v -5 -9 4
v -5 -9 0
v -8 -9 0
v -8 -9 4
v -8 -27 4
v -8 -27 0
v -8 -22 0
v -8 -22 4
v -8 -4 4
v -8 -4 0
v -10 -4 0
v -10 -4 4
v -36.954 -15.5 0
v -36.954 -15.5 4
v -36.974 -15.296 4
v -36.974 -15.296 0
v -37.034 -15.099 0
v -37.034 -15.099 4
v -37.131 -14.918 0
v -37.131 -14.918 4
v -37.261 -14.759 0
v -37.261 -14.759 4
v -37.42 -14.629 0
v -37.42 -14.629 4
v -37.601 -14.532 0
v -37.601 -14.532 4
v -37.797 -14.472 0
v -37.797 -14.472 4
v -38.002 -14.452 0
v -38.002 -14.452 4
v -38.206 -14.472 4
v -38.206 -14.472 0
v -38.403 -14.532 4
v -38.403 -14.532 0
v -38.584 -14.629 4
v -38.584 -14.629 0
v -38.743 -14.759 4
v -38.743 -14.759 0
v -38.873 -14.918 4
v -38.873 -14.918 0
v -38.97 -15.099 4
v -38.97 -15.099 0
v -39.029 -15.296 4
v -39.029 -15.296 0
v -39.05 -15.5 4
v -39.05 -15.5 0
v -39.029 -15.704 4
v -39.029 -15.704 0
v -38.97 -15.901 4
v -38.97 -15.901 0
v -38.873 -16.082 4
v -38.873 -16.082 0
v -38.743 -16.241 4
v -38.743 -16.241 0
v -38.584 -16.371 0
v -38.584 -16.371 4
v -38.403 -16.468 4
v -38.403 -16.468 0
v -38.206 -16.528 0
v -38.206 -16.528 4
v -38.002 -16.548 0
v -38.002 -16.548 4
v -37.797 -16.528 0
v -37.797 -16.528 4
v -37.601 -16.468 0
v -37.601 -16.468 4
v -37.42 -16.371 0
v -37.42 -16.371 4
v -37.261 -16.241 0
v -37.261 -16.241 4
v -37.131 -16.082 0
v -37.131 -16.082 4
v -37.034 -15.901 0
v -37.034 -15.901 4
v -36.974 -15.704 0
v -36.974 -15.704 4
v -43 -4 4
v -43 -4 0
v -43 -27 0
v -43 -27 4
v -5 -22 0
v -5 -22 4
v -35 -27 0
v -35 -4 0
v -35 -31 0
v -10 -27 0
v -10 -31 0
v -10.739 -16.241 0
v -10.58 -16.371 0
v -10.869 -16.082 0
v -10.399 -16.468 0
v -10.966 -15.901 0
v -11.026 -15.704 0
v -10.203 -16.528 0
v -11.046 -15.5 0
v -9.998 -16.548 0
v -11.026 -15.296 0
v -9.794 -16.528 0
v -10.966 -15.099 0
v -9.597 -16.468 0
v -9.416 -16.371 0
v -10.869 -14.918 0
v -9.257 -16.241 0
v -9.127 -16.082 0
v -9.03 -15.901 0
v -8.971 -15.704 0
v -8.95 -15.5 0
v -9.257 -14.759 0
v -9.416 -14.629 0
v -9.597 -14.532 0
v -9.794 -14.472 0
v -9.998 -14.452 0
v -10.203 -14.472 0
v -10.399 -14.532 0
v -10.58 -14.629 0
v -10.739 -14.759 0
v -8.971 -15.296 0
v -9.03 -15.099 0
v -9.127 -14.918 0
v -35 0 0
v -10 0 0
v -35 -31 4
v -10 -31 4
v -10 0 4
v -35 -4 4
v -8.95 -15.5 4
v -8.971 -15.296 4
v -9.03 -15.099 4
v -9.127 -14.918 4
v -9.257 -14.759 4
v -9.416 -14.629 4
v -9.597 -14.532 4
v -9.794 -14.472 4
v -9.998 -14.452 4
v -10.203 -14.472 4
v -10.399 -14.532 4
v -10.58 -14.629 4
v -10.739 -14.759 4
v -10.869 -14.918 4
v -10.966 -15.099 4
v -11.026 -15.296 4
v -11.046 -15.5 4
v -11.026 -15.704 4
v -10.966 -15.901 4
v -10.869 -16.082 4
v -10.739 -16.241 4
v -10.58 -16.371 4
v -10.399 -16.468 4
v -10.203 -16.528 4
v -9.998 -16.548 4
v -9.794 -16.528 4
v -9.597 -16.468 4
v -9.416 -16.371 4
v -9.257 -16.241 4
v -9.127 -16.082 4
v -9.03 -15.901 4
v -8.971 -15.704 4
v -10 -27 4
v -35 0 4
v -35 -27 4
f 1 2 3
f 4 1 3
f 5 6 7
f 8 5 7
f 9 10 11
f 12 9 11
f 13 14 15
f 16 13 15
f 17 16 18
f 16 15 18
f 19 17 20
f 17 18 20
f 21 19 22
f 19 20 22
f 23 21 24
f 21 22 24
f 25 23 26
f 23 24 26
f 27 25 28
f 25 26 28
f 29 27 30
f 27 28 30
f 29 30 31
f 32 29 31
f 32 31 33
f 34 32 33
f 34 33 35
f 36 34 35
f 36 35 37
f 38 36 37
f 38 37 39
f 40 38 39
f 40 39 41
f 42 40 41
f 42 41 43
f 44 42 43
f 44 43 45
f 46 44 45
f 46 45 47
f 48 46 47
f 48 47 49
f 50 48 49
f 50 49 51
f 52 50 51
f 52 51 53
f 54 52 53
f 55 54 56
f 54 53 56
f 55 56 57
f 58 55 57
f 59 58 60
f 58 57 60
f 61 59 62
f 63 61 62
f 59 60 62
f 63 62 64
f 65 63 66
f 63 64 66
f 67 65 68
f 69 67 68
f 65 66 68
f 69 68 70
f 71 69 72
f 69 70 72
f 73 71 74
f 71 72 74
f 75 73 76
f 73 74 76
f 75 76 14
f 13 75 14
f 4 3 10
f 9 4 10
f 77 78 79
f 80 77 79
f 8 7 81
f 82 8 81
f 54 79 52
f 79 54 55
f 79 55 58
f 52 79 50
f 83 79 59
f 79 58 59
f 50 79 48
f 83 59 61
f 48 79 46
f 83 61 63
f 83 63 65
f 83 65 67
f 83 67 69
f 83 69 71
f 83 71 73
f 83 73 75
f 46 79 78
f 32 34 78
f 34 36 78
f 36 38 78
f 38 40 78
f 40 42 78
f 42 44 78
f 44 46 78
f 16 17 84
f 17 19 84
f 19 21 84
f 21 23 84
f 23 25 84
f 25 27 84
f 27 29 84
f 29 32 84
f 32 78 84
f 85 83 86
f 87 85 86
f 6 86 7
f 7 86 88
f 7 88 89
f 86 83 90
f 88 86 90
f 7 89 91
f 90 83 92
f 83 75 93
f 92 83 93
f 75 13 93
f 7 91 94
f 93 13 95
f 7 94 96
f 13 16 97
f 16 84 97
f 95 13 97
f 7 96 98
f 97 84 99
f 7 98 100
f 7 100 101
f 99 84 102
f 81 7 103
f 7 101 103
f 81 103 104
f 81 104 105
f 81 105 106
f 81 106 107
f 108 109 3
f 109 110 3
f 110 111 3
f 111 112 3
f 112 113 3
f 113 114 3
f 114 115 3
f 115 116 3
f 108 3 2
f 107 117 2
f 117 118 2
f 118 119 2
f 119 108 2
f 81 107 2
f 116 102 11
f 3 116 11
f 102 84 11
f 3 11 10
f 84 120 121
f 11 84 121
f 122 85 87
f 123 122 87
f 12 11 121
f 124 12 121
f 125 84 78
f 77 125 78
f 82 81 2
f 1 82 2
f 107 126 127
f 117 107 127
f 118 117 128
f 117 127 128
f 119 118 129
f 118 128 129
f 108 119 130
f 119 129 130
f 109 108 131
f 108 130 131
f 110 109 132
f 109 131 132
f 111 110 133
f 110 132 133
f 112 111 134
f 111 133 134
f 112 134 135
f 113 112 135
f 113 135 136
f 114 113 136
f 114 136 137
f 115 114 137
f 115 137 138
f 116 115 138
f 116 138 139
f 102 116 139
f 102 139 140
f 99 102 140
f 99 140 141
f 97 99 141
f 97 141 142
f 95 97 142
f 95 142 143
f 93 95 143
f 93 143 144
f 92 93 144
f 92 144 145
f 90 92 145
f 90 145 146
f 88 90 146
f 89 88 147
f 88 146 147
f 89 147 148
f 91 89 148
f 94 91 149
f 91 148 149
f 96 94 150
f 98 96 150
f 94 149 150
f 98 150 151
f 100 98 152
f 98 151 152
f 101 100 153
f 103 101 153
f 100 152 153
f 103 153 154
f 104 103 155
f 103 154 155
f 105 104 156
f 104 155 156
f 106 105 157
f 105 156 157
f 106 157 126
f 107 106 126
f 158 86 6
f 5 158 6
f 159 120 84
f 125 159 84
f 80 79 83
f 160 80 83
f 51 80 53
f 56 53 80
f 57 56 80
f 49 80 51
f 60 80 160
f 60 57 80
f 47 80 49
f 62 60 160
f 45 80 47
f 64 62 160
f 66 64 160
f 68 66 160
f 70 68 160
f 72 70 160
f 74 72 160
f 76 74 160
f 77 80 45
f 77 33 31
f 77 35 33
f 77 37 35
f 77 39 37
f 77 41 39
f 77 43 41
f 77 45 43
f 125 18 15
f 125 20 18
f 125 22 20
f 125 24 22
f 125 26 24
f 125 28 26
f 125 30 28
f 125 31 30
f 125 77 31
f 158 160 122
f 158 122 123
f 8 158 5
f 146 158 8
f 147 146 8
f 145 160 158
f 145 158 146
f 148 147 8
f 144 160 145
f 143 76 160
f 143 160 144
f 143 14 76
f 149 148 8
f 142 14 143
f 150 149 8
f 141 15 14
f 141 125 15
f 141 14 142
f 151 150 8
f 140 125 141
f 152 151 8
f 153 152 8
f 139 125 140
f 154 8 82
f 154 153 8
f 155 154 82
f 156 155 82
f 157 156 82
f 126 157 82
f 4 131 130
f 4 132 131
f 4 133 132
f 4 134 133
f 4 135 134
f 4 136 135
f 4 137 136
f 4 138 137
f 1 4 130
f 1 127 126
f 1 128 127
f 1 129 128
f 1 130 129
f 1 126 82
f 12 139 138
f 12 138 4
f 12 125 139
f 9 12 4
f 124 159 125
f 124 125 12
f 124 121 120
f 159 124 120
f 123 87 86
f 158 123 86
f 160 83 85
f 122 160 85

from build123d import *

# Parameters (mm, degrees)
SALIENTE_EXTRUIR1_DEPTH = 4
CORTAR_EXTRUIR1_REACH   = 55.16
CROQUIS2_R              = 1.04775


with BuildPart() as part:
    # Croquis1 → Saliente-Extruir1 (new body)
    with BuildSketch(Plane.XY):
        Polygon((-35, 0), (-35, -4), (-43, -4), (-43, -27), (-35, -27), (-35, -31), (-10, -31), (-10, -27), (-8, -27), (-8, -22), (-5, -22), (-5, -9), (-8, -9), (-8, -4), (-10, -4), (-10, 0), align=None)
    extrude(amount=SALIENTE_EXTRUIR1_DEPTH)

    # Croquis2 → Cortar-Extruir1 (cut, up to next)
    with BuildSketch(Plane.XY.offset(4), mode=Mode.PRIVATE) as cortar_extruir1_sk1:
        with Locations((-38.00175, -15.5)):
            Circle(CROQUIS2_R)
    cortar_extruir1_tool1 = extrude(cortar_extruir1_sk1.sketch, amount=-CORTAR_EXTRUIR1_REACH, mode=Mode.PRIVATE) & part.part
    # Croquis2 → Cortar-Extruir1 (cut, up to next)
    with BuildSketch(Plane.XY.offset(4), mode=Mode.PRIVATE) as cortar_extruir1_sk2:
        with Locations((-9.99825, -15.5)):
            Circle(CROQUIS2_R)
    cortar_extruir1_tool2 = extrude(cortar_extruir1_sk2.sketch, amount=-CORTAR_EXTRUIR1_REACH, mode=Mode.PRIVATE) & part.part
    add(cortar_extruir1_tool1.solids().sort_by_distance((-38.00175, -15.5, 4))[0], mode=Mode.SUBTRACT)
    add(cortar_extruir1_tool2.solids().sort_by_distance((-9.99825, -15.5, 4))[0], mode=Mode.SUBTRACT)


solid = part.part
